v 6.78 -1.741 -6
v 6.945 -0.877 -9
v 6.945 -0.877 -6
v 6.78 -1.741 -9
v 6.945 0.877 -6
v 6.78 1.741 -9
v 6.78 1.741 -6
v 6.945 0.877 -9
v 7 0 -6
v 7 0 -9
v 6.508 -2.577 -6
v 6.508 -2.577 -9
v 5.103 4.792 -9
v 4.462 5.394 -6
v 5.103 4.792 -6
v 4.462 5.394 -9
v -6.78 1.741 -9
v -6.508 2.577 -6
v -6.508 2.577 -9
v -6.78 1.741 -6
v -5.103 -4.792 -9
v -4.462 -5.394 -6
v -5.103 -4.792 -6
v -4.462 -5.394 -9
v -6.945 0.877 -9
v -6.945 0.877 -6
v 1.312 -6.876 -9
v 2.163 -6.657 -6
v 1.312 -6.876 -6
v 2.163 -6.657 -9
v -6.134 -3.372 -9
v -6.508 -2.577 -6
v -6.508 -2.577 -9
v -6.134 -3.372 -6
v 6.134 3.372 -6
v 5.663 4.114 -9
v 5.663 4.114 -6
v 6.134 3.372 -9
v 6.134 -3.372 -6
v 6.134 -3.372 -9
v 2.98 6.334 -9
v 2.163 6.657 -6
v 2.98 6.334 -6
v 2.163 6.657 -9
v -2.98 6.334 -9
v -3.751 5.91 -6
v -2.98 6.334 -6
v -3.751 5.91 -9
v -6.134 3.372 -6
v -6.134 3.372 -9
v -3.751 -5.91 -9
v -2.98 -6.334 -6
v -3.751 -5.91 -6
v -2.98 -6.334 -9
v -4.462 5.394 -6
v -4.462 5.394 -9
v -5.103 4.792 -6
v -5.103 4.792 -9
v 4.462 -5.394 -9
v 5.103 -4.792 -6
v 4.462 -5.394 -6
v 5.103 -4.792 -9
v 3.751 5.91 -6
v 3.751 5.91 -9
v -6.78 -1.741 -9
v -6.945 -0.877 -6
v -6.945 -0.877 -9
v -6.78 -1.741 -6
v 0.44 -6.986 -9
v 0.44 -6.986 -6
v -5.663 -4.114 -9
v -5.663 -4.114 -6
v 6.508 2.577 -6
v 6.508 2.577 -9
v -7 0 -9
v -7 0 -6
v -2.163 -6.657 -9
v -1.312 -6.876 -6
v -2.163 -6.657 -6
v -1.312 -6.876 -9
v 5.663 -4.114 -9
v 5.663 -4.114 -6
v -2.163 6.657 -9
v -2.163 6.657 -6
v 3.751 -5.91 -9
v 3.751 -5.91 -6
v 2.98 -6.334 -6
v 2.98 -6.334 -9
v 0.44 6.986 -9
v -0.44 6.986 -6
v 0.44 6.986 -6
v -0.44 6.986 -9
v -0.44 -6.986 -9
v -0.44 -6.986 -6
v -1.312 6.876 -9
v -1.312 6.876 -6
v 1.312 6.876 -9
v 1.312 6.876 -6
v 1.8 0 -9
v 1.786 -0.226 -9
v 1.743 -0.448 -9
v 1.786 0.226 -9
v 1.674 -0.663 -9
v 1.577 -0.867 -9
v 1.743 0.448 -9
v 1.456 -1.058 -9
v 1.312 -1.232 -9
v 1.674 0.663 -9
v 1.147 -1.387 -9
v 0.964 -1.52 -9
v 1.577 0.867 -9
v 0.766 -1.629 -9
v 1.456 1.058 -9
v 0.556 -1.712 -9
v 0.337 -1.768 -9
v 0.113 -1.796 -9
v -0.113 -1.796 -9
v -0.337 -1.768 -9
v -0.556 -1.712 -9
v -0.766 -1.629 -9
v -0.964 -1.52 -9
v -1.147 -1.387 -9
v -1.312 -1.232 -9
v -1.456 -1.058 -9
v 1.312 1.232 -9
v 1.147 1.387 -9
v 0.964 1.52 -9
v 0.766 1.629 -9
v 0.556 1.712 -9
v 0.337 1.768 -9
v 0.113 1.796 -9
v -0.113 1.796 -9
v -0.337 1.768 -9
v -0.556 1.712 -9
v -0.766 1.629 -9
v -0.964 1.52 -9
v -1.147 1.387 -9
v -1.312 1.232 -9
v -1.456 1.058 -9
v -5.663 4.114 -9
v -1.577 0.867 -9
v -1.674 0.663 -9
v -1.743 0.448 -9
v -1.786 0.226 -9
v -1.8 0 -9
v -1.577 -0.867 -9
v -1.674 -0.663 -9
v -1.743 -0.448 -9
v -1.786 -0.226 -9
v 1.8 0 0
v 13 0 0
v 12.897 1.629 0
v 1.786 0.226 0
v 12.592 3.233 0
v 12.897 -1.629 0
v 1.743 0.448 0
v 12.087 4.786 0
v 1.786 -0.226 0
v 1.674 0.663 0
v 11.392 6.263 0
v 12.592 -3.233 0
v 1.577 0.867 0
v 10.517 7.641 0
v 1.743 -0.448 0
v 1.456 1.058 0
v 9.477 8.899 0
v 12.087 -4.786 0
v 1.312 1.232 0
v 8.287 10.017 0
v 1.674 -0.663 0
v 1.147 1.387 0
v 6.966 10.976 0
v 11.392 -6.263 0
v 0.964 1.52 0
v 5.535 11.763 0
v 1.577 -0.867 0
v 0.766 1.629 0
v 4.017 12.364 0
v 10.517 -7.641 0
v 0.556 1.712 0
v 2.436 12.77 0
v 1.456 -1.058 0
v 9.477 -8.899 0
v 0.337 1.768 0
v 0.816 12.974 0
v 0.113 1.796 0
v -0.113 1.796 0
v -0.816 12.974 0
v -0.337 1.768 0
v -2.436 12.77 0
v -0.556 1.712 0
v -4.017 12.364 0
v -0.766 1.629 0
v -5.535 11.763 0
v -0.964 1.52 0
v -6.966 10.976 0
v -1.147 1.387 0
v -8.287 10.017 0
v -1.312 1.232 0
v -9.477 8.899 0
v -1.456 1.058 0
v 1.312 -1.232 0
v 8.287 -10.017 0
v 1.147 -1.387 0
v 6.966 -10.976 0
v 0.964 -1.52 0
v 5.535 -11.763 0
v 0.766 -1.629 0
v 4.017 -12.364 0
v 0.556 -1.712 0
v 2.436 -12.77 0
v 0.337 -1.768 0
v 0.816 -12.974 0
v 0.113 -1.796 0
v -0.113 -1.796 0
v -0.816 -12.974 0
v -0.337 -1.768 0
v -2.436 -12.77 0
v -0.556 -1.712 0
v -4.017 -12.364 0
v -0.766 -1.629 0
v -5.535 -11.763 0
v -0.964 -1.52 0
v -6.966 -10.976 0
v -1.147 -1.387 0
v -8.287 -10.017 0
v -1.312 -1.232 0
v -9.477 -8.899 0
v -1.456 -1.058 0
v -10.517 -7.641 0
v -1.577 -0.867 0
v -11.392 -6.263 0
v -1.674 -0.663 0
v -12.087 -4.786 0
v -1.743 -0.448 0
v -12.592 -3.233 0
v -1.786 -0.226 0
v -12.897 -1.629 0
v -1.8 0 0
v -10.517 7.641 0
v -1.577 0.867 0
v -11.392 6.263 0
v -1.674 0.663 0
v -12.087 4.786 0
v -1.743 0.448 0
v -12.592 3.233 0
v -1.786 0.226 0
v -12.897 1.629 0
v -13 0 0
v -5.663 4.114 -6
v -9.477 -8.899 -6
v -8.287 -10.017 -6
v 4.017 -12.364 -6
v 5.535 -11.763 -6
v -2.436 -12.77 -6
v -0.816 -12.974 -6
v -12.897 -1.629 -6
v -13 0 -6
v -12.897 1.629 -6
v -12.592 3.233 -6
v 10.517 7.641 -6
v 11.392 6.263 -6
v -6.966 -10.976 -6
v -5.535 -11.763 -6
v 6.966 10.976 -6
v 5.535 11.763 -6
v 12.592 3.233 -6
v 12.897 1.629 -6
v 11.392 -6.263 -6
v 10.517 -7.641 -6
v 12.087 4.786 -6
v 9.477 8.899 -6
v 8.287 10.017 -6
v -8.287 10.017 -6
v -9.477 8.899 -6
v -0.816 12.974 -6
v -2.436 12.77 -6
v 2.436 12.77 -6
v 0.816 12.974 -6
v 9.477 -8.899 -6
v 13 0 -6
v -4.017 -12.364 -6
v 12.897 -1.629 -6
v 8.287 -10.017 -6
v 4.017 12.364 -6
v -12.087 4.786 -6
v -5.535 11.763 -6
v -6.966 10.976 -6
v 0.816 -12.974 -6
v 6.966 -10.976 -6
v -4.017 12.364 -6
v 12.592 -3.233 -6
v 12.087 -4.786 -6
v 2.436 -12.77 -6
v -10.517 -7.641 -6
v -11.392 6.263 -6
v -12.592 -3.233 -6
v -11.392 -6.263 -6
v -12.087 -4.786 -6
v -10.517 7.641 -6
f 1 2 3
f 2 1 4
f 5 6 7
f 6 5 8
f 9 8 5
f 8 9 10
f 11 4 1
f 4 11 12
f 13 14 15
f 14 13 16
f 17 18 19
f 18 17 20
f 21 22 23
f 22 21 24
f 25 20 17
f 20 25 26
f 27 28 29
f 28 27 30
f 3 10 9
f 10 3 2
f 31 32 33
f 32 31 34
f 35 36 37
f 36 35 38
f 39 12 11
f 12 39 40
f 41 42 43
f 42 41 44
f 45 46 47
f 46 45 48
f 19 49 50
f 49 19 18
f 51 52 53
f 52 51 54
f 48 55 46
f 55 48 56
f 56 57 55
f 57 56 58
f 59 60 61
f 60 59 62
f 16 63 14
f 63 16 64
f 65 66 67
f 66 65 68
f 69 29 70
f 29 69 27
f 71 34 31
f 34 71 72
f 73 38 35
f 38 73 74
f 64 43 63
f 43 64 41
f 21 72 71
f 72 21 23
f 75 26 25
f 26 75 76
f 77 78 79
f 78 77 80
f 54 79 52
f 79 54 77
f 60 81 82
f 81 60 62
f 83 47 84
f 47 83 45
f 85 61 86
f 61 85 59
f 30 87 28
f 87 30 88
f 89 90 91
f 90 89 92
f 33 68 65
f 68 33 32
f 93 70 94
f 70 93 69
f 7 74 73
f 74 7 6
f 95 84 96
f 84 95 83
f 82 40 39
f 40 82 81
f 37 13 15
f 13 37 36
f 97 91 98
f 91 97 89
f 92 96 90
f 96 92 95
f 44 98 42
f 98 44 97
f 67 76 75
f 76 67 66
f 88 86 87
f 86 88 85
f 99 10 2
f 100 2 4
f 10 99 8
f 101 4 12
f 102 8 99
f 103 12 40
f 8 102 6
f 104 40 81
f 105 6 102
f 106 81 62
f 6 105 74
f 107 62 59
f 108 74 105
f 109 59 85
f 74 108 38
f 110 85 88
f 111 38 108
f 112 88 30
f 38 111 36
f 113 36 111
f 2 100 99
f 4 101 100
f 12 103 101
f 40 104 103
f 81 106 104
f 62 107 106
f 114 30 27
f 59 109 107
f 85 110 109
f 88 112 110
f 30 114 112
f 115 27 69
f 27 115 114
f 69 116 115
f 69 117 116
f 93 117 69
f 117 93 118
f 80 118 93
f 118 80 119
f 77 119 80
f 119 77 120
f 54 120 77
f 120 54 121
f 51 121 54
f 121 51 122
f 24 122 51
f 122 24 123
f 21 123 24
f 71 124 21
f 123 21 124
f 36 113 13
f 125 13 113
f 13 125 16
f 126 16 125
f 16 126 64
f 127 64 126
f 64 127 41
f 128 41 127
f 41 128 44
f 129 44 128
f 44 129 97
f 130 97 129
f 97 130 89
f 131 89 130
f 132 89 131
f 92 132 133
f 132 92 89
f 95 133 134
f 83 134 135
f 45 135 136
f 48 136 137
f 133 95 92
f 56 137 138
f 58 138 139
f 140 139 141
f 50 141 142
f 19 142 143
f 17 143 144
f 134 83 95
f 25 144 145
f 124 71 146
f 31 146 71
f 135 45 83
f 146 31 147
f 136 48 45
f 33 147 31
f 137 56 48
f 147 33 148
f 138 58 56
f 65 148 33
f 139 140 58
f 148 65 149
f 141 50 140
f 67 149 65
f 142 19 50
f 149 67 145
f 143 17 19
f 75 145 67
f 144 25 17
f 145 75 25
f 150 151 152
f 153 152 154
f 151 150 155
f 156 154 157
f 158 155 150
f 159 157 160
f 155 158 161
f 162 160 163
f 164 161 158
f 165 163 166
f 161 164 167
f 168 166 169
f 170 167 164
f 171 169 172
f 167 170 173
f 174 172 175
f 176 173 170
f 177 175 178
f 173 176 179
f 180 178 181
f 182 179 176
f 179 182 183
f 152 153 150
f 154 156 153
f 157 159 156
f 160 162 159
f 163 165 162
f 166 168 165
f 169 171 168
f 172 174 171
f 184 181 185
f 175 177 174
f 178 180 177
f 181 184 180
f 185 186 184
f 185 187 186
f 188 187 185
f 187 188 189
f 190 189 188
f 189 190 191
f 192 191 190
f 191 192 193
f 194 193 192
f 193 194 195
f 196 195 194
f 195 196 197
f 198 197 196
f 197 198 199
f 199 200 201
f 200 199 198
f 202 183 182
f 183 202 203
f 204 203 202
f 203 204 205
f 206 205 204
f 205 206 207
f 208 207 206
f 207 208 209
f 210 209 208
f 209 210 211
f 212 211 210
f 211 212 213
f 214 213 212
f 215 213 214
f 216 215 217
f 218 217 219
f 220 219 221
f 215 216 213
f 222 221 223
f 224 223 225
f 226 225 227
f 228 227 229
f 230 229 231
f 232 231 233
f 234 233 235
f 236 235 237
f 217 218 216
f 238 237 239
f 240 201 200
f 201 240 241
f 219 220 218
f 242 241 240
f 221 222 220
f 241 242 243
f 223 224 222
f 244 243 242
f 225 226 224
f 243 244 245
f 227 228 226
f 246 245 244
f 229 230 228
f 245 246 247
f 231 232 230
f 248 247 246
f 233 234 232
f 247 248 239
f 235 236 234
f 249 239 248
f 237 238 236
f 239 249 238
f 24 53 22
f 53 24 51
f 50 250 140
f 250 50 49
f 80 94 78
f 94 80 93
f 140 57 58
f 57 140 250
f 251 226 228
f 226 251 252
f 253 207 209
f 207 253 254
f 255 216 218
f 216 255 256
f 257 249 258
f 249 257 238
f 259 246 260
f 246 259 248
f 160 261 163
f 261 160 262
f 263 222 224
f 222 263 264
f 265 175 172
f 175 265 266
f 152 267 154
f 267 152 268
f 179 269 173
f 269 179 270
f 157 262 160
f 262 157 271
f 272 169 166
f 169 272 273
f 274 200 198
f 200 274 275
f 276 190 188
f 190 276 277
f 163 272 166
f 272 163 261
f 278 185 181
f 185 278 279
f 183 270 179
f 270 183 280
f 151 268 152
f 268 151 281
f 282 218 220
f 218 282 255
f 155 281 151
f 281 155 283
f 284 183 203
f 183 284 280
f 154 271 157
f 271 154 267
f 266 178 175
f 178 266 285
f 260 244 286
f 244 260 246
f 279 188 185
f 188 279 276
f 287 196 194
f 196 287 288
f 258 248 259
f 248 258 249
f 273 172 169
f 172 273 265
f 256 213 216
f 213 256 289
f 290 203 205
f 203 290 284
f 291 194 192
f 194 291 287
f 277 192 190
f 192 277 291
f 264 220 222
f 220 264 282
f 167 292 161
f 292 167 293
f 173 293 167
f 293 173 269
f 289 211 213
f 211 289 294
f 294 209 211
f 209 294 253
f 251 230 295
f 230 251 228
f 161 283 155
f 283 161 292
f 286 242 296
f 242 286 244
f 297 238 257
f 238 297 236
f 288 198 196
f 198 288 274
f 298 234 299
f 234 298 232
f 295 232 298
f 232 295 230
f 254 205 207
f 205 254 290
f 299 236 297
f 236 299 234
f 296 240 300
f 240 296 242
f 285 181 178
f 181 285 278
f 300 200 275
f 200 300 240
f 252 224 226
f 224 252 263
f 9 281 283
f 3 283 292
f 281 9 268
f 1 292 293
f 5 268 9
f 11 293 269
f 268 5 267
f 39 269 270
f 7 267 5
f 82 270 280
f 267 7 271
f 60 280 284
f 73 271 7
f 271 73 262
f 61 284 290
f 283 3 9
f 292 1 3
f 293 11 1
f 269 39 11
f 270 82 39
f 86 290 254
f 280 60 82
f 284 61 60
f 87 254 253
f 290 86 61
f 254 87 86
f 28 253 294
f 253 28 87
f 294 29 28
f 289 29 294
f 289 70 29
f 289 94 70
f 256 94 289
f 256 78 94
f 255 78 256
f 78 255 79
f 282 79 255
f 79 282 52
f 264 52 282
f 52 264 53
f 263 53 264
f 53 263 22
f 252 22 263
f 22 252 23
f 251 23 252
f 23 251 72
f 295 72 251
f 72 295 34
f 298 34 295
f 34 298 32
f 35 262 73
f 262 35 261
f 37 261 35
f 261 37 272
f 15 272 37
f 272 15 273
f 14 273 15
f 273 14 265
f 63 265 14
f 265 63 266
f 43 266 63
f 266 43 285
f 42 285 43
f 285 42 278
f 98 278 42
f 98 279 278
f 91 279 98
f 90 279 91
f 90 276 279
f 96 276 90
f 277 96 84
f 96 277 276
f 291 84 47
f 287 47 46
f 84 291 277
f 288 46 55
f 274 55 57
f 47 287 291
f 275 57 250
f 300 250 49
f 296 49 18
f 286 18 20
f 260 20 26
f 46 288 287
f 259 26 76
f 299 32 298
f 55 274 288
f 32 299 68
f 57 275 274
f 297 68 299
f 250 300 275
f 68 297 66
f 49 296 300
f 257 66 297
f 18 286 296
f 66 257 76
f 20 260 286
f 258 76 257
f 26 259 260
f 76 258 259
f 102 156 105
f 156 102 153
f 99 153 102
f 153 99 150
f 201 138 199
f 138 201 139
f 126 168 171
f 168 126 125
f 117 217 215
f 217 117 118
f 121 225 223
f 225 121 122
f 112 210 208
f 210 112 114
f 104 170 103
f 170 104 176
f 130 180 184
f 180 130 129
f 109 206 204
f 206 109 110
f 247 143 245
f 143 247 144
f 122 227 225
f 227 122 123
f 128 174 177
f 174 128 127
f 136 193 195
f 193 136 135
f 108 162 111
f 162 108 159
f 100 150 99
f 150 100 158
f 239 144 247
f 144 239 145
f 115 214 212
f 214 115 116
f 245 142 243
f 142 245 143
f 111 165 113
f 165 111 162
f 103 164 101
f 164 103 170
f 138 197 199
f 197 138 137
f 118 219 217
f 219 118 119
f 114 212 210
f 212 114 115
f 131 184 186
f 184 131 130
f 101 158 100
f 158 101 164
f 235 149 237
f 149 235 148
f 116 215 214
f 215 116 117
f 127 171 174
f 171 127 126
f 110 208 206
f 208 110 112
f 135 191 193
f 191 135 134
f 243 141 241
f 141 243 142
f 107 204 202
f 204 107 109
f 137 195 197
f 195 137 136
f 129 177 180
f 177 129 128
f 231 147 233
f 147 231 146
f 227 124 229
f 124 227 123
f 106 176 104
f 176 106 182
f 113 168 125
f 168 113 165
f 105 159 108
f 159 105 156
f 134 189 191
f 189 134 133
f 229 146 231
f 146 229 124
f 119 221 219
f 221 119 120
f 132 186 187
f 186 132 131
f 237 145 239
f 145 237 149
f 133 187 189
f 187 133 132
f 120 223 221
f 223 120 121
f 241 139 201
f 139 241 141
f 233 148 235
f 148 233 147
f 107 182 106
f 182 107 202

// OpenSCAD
$fn = 50;


difference() {
	union() {
		translate(v = [0, 0, -9.0000000000]) {
			cylinder(h = 9, r = 7.0000000000);
		}
		translate(v = [0, 0, -6.0000000000]) {
			cylinder(h = 6, r = 13.0000000000);
		}
	}
	union() {
		#translate(v = [0, 0, -9]) {
			cylinder(h = 9, r = 1.8000000000);
		}
	}
}
